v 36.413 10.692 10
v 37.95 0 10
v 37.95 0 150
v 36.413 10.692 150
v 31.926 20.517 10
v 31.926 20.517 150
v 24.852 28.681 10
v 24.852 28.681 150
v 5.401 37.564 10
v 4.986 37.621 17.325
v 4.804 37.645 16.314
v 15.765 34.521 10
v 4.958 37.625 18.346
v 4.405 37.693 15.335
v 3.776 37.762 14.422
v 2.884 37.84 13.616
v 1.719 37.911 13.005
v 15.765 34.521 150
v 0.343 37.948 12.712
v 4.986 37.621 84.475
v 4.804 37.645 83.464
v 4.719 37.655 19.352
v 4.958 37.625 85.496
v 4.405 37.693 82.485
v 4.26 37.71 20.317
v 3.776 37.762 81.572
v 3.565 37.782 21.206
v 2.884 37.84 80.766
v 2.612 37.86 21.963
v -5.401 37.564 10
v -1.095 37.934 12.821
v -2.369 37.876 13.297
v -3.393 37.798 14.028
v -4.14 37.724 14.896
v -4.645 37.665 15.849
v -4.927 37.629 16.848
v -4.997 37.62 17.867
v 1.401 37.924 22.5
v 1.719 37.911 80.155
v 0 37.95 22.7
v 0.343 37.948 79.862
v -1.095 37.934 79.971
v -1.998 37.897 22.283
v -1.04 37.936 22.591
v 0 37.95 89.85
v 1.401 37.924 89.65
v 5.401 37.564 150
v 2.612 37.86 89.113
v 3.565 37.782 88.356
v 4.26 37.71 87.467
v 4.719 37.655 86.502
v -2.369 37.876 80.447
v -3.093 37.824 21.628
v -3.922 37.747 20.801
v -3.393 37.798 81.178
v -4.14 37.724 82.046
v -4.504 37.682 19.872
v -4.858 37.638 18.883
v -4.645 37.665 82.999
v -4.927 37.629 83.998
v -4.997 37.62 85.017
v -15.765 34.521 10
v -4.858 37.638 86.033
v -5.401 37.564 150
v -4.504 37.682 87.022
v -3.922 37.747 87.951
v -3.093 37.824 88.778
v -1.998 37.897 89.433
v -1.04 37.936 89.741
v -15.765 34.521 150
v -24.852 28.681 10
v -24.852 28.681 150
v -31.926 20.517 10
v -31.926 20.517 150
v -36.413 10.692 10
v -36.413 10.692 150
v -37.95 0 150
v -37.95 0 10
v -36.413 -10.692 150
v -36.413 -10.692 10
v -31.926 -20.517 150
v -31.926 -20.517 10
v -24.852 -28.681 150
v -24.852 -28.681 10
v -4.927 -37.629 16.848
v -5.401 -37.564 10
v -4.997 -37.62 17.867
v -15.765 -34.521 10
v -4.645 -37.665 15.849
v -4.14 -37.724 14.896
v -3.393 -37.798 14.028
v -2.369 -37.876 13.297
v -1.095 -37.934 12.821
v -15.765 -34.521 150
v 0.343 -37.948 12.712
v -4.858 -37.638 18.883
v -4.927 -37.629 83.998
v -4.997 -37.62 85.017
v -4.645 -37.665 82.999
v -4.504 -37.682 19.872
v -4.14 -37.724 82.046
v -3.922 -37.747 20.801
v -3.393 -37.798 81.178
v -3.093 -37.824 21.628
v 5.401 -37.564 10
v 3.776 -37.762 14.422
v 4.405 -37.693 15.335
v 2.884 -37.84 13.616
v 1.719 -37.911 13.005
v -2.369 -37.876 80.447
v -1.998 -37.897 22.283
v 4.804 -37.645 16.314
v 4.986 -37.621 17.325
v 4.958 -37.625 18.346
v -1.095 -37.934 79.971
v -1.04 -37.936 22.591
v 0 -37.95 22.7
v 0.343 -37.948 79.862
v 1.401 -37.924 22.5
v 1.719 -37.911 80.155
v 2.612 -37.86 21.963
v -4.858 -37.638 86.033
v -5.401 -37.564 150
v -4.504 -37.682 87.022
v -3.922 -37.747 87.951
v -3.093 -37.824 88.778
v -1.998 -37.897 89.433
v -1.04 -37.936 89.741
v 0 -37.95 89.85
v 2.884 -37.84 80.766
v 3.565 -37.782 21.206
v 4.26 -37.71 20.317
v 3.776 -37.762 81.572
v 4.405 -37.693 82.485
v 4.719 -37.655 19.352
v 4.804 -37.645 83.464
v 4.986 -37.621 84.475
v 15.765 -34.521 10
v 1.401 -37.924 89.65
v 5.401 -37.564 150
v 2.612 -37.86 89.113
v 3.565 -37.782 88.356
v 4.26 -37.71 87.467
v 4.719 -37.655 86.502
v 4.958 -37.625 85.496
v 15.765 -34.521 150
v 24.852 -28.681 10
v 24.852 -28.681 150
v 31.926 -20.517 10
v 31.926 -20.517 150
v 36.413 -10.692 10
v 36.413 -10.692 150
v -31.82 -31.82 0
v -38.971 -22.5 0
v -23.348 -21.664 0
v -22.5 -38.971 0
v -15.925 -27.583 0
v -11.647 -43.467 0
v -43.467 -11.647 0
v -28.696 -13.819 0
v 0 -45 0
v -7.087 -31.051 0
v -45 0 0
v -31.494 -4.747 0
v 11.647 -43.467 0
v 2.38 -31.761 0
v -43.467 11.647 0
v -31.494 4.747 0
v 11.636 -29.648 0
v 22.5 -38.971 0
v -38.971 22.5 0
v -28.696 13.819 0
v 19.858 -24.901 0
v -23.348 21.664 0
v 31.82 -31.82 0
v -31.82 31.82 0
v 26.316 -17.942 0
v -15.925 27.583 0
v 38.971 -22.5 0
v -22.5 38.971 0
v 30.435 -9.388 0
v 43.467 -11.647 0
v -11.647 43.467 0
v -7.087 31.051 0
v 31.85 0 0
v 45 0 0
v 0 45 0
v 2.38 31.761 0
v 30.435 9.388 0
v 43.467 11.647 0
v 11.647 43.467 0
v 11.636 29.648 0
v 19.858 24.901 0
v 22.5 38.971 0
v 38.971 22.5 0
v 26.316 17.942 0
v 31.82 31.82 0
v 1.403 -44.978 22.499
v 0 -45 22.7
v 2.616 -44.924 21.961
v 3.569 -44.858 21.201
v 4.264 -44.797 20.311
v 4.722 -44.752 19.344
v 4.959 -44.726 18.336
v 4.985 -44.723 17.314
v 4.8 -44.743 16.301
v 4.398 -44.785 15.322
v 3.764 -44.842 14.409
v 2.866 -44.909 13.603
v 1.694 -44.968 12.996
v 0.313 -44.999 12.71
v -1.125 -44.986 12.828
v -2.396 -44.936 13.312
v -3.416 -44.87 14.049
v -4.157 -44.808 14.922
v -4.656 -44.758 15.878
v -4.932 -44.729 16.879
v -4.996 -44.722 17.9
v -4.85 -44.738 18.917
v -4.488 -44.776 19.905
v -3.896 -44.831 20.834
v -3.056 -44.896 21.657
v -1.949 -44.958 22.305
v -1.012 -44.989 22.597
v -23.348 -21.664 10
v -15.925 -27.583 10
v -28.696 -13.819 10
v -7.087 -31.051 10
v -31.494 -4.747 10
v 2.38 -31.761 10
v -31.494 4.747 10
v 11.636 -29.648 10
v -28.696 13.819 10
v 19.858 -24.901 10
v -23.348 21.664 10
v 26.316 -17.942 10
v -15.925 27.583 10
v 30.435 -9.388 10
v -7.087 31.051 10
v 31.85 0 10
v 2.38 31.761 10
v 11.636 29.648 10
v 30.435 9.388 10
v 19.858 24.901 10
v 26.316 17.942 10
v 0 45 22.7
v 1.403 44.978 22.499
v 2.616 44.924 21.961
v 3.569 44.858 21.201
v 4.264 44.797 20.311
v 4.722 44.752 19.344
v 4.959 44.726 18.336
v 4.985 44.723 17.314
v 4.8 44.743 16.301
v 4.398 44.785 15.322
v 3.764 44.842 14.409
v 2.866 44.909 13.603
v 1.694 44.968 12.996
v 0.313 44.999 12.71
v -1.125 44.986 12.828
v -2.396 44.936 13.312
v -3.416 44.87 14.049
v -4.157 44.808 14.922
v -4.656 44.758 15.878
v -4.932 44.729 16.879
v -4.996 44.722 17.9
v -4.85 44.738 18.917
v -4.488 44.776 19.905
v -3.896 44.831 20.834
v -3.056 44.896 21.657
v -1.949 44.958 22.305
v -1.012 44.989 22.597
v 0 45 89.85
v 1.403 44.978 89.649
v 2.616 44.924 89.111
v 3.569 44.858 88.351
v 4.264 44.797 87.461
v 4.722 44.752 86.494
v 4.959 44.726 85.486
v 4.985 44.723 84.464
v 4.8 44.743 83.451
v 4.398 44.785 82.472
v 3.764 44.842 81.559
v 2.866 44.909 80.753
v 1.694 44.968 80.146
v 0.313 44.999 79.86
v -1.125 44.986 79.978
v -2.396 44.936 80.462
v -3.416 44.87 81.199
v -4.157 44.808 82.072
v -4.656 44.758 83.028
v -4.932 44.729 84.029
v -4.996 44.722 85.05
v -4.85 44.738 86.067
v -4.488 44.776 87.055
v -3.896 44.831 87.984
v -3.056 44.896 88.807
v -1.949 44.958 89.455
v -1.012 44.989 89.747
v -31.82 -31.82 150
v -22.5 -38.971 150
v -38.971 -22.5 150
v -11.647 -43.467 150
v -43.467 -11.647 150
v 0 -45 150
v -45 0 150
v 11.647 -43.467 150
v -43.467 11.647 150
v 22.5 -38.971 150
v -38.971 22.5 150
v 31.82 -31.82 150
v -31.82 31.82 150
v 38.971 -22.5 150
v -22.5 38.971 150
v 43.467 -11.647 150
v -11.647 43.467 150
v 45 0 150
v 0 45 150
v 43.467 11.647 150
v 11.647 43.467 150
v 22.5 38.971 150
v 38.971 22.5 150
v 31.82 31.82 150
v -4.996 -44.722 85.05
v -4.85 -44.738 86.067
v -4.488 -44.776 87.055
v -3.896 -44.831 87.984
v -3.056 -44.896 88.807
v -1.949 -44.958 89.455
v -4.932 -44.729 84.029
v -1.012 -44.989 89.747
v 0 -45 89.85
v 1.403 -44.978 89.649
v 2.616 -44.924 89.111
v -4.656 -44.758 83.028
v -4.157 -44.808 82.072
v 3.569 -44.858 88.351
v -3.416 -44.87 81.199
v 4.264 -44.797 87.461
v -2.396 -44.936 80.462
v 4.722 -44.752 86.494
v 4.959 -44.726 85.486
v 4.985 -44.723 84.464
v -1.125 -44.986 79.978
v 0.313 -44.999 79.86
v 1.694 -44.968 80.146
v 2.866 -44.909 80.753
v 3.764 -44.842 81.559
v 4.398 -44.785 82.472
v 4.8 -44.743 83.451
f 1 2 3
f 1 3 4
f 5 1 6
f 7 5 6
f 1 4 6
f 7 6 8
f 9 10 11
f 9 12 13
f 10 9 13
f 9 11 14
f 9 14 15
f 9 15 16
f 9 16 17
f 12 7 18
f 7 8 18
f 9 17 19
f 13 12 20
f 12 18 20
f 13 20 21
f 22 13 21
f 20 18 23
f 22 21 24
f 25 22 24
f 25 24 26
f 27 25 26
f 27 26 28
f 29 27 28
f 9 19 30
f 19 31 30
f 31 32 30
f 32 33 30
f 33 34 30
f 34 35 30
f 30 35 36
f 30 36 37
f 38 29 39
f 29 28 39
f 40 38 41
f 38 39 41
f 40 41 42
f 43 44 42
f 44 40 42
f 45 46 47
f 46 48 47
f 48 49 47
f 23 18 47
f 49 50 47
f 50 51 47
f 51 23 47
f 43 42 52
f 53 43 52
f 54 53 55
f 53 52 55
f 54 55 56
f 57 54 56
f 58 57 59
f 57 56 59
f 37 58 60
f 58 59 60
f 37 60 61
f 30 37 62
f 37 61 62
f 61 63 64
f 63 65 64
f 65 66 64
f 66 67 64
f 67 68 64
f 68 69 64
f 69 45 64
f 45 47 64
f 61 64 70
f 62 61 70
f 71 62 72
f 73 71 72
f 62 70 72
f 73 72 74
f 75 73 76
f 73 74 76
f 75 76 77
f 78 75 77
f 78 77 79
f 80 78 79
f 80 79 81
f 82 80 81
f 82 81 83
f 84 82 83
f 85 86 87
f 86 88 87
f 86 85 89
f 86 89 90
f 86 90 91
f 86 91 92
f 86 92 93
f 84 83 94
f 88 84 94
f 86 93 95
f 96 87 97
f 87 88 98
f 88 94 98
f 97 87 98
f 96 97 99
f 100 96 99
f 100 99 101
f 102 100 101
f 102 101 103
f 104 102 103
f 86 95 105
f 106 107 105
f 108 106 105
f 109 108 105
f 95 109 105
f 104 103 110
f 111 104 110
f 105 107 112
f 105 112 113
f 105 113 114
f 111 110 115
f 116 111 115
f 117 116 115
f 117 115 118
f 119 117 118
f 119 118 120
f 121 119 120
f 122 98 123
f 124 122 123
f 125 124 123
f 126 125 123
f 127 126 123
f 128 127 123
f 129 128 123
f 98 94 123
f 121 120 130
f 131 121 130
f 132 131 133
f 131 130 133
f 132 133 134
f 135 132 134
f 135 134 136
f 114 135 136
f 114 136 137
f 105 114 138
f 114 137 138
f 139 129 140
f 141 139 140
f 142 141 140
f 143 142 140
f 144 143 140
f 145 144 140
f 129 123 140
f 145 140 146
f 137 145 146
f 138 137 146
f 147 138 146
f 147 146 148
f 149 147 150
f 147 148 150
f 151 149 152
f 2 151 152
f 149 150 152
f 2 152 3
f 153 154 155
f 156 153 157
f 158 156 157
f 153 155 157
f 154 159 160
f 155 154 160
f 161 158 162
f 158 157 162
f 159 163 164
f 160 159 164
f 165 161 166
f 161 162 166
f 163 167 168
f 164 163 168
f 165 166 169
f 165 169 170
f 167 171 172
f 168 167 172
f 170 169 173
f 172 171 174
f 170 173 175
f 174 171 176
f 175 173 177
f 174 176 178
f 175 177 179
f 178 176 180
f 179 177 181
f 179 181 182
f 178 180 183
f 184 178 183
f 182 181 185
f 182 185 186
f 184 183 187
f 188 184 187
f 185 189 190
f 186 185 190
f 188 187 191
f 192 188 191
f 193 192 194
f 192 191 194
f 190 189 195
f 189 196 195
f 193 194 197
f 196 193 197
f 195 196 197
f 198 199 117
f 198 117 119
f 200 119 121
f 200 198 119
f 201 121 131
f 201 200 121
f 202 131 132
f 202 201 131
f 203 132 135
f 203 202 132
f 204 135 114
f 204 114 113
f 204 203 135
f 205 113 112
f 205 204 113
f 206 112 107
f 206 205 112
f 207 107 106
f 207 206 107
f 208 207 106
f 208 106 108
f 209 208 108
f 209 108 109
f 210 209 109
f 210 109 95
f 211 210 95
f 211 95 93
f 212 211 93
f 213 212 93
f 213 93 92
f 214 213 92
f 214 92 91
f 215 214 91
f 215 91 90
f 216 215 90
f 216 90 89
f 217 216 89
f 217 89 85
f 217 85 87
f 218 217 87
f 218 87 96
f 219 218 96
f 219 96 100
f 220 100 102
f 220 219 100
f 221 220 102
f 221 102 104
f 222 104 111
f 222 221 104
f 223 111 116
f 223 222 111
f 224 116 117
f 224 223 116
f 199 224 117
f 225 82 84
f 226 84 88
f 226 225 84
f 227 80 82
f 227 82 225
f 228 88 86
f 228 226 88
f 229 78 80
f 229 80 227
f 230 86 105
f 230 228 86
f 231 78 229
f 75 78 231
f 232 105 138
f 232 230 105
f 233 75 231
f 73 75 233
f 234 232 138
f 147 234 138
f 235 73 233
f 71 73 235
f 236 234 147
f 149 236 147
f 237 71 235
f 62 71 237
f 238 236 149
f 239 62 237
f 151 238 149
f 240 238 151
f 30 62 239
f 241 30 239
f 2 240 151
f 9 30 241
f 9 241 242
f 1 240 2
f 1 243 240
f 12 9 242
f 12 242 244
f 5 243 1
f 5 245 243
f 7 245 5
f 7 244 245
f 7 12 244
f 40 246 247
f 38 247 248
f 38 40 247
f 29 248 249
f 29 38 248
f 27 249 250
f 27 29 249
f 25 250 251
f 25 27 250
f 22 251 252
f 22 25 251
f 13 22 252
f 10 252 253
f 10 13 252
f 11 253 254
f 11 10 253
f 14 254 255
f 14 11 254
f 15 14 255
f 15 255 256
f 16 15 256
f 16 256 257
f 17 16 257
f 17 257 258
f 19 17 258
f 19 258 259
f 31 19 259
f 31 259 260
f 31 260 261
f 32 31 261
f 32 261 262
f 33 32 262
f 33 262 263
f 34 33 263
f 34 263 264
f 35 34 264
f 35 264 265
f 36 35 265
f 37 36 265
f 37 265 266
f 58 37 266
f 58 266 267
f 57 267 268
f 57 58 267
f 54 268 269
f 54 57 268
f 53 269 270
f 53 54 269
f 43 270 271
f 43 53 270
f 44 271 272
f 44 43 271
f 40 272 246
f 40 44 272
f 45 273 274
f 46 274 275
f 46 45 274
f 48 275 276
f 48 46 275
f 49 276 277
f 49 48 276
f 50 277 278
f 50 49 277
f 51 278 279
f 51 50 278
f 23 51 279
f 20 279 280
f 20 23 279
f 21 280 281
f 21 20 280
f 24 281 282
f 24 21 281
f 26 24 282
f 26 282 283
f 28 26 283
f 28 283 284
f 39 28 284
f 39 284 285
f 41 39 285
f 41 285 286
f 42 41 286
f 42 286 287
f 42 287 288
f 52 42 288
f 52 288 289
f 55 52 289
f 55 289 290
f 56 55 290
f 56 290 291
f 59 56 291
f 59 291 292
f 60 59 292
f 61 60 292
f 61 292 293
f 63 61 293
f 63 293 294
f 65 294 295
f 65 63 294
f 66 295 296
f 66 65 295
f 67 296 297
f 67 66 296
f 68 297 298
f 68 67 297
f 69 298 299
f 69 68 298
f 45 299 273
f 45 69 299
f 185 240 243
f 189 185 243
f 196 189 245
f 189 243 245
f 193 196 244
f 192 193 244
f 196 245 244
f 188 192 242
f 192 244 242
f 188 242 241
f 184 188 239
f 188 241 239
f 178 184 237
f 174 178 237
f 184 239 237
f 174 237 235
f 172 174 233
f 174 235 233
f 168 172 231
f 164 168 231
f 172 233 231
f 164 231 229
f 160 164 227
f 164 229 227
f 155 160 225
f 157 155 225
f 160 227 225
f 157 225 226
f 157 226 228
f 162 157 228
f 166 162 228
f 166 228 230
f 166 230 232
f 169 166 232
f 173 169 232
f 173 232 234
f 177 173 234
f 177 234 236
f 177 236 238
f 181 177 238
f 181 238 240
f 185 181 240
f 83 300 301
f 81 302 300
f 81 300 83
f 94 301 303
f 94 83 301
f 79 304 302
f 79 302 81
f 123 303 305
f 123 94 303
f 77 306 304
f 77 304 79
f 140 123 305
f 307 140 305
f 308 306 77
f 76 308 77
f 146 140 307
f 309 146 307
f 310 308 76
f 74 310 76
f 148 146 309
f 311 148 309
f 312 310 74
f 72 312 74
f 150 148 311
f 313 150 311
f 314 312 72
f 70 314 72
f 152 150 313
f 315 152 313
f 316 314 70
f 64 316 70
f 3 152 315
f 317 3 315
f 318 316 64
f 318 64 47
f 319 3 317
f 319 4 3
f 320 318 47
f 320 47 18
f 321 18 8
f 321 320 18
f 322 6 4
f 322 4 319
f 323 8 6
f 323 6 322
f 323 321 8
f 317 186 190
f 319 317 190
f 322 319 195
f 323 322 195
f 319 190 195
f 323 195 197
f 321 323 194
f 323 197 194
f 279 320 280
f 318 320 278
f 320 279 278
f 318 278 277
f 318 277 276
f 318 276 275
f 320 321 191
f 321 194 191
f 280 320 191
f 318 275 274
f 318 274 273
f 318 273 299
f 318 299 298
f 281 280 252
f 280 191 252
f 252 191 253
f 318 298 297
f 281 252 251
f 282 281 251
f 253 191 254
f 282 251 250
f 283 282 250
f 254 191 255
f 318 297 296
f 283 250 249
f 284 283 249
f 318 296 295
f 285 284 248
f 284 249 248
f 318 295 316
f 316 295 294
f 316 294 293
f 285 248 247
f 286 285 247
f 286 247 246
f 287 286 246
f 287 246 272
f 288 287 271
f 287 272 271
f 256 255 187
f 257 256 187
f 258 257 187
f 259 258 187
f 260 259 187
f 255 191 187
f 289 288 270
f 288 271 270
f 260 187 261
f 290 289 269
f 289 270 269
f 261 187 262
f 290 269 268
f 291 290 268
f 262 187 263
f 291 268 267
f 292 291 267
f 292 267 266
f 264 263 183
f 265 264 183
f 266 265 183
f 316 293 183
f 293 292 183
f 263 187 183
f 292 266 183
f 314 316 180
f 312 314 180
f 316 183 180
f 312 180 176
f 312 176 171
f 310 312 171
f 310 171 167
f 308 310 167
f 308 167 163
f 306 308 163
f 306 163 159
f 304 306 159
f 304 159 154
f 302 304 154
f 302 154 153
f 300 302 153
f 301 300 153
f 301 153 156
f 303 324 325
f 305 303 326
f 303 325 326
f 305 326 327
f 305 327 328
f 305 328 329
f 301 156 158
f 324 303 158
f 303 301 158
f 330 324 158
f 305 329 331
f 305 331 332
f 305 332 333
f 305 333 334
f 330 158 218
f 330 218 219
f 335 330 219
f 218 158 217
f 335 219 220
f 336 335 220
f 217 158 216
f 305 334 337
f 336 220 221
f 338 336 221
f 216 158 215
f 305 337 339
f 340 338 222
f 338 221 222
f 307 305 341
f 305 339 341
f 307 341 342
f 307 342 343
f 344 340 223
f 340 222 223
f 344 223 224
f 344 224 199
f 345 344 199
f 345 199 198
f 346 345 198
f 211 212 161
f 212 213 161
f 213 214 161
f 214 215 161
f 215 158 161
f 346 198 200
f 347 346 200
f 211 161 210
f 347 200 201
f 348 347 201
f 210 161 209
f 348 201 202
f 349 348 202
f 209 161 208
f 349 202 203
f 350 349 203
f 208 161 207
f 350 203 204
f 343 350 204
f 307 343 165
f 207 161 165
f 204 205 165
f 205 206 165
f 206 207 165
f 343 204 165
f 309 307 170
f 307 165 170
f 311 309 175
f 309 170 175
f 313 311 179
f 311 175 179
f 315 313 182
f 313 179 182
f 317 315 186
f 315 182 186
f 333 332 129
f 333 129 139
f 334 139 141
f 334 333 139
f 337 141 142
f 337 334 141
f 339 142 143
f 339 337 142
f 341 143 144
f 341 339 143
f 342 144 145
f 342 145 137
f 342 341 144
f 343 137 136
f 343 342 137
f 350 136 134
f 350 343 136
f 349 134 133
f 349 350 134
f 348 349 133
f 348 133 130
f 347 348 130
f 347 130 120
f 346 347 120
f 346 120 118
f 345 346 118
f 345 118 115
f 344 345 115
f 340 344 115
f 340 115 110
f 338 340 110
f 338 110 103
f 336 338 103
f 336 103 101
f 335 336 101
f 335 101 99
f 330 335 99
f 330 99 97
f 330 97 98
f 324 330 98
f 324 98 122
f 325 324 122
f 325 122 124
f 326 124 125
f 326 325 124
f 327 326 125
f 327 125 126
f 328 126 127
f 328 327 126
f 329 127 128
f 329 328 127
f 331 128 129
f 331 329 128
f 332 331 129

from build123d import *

# Parameters (mm, degrees)
SKETCH1_R               = 45
BOSS_EXTRUDE1_DEPTH     = 150
SKETCH2_R               = 31.85
CUT_EXTRUDE1_DEPTH      = 163.941707368
SKETCH3_R               = 37.95
CUT_EXTRUDE2_DEPTH      = 140
CUT_EXTRUDE5_DEPTH      = 163.941707368
CUT_EXTRUDE5_DEPTH_BACK = 163.941707368
SKETCH8_R               = 5


with BuildPart() as part:
    # Sketch1 → Boss-Extrude1 (new body)
    with BuildSketch(Plane.XY):
        Circle(SKETCH1_R)
    extrude(amount=BOSS_EXTRUDE1_DEPTH)

    # Sketch2 → Cut-Extrude1 (cut, through all)
    with BuildSketch(Plane.XY.offset(150)):
        Circle(SKETCH2_R)
    extrude(amount=-CUT_EXTRUDE1_DEPTH, mode=Mode.SUBTRACT)

    # Sketch3 → Cut-Extrude2 (cut)
    with BuildSketch(Plane.XY.offset(150)):
        Circle(SKETCH3_R)
    extrude(amount=-CUT_EXTRUDE2_DEPTH, mode=Mode.SUBTRACT)

    # Sketch8 → Cut-Extrude5 (cut, two sides: drawn at the far end of the back side and taken through both)
    with BuildSketch(Plane(origin=(0, 0, 0), x_dir=(1, 0, 0), z_dir=(0, 1, 0)).offset(-CUT_EXTRUDE5_DEPTH_BACK)):
        with Locations(Location((0, -17.7, 0), (0, 0, 270))):
            Circle(SKETCH8_R)
        with Locations(Location((0, -84.85, 0), (0, 0, 270))):
            Circle(SKETCH8_R)
    extrude(amount=CUT_EXTRUDE5_DEPTH + CUT_EXTRUDE5_DEPTH_BACK, mode=Mode.SUBTRACT)


solid = part.part
